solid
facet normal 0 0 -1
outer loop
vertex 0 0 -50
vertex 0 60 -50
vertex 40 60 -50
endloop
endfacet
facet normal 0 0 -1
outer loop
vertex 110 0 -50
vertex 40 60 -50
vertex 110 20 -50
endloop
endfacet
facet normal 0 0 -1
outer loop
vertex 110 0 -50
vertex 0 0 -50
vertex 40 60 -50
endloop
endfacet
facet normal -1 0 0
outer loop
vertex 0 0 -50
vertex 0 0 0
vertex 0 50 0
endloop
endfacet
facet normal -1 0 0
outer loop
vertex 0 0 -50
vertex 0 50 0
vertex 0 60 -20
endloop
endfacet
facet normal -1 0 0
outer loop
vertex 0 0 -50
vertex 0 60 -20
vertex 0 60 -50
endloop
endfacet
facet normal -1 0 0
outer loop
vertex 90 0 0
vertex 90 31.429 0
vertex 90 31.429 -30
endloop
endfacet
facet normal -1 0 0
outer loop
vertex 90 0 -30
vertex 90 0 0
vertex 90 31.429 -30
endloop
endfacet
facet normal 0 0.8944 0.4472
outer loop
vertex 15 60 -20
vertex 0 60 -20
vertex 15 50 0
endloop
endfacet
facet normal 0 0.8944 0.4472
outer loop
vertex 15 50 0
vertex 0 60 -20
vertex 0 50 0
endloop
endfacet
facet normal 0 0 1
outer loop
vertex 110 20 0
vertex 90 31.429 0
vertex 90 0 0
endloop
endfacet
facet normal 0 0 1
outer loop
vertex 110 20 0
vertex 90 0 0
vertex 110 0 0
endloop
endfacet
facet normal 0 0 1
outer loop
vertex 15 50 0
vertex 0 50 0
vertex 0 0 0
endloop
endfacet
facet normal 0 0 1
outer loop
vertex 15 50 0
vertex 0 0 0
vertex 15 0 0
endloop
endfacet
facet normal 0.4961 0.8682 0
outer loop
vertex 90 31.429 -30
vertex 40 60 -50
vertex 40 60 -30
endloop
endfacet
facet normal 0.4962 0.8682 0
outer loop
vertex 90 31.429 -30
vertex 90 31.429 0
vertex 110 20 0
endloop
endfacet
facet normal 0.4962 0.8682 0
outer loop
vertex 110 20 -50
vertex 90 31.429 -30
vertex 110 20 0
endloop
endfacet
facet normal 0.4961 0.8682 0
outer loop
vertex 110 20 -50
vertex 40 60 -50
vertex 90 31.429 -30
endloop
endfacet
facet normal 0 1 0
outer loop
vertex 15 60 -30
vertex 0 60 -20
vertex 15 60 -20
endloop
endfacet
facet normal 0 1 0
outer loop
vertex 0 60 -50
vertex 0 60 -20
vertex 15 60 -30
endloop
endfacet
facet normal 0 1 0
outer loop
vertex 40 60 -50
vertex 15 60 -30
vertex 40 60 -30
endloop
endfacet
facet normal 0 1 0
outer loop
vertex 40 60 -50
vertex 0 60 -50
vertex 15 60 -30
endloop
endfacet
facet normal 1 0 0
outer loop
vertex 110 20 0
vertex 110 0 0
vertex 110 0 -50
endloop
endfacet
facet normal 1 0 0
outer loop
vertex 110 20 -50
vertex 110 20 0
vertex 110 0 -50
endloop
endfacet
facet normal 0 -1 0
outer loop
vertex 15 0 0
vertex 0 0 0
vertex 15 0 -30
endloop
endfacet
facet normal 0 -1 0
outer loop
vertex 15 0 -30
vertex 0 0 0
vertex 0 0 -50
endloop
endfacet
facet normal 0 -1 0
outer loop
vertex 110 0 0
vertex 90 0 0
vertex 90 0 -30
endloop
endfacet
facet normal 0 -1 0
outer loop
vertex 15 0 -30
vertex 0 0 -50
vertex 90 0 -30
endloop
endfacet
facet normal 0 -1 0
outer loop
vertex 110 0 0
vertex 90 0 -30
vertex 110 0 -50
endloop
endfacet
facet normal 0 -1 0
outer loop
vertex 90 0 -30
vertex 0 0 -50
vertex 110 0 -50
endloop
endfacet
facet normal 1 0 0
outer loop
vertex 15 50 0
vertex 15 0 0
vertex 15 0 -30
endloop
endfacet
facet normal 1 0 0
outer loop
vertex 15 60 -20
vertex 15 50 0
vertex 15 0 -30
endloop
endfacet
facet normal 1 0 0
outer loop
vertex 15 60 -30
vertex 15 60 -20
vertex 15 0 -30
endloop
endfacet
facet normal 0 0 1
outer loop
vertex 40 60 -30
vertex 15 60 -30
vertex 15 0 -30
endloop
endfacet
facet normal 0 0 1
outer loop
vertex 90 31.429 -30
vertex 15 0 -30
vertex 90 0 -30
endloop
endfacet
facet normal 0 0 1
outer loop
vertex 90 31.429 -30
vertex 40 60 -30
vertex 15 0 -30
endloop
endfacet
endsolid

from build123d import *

# Parameters (mm, degrees)
SKETCH_1_W               = 110
SKETCH_1_H               = 50
EXTRUDE_1_DEPTH          = 60
SKETCH_2_W               = 75
SKETCH_2_H               = 30
CUT_EXTRUDE_1_DEPTH      = 135.907375632
CUT_EXTRUDE_2_DEPTH      = 135.907375632
CUT_EXTRUDE_2_DEPTH_BACK = 135.907375632
CUT_EXTRUDE_3_DEPTH      = 123.983738762
CUT_EXTRUDE_3_DEPTH_BACK = 123.983738762


with BuildPart() as part:
    # 스케치1 → 보스-돌출1 (new body)
    with BuildSketch(Plane(origin=(0, 0, 0), x_dir=(1, 0, 0), z_dir=(0, 1, 0))):
        with Locations((55, 25)):
            Rectangle(SKETCH_1_W, SKETCH_1_H)
    extrude(amount=EXTRUDE_1_DEPTH)

    # 스케치2 → 컷-돌출1 (cut, through all)
    with BuildSketch(Plane(origin=(0, 60, 0), x_dir=(1, 0, 0), z_dir=(0, 1, 0))):
        with Locations((52.5, 15)):
            Rectangle(SKETCH_2_W, SKETCH_2_H)
    extrude(amount=-CUT_EXTRUDE_1_DEPTH, mode=Mode.SUBTRACT)

    # 스케치4 → 컷-돌출2 (cut, two sides: drawn at the far end of the back side and taken through both)
    with BuildSketch(Plane.XY.offset(-CUT_EXTRUDE_2_DEPTH_BACK)):
        Polygon((-171.932939983, 181.104537133), (40, 60), (110, 20), (321.932939983, -101.104537133), (564.14201425, 322.761342833), (70.276134283, 604.9704171), align=None)
    extrude(amount=CUT_EXTRUDE_2_DEPTH + CUT_EXTRUDE_2_DEPTH_BACK, mode=Mode.SUBTRACT)

    # 스케치5 → 컷-돌출3 (cut, two sides: drawn at the far end of the back side and taken through both)
    with BuildSketch(Plane(origin=(15, 0, 0), x_dir=(0, 0, -1), z_dir=(1, 0, 0)).offset(-CUT_EXTRUDE_3_DEPTH_BACK)):
        Polygon((155.435378317, 127.717689158), (20, 60), (0, 50), (-135.435378317, -17.717689158), (-270.870756633, 253.153067475), (20, 398.588445792), align=None)
    extrude(amount=CUT_EXTRUDE_3_DEPTH + CUT_EXTRUDE_3_DEPTH_BACK, mode=Mode.SUBTRACT)


solid = part.part
